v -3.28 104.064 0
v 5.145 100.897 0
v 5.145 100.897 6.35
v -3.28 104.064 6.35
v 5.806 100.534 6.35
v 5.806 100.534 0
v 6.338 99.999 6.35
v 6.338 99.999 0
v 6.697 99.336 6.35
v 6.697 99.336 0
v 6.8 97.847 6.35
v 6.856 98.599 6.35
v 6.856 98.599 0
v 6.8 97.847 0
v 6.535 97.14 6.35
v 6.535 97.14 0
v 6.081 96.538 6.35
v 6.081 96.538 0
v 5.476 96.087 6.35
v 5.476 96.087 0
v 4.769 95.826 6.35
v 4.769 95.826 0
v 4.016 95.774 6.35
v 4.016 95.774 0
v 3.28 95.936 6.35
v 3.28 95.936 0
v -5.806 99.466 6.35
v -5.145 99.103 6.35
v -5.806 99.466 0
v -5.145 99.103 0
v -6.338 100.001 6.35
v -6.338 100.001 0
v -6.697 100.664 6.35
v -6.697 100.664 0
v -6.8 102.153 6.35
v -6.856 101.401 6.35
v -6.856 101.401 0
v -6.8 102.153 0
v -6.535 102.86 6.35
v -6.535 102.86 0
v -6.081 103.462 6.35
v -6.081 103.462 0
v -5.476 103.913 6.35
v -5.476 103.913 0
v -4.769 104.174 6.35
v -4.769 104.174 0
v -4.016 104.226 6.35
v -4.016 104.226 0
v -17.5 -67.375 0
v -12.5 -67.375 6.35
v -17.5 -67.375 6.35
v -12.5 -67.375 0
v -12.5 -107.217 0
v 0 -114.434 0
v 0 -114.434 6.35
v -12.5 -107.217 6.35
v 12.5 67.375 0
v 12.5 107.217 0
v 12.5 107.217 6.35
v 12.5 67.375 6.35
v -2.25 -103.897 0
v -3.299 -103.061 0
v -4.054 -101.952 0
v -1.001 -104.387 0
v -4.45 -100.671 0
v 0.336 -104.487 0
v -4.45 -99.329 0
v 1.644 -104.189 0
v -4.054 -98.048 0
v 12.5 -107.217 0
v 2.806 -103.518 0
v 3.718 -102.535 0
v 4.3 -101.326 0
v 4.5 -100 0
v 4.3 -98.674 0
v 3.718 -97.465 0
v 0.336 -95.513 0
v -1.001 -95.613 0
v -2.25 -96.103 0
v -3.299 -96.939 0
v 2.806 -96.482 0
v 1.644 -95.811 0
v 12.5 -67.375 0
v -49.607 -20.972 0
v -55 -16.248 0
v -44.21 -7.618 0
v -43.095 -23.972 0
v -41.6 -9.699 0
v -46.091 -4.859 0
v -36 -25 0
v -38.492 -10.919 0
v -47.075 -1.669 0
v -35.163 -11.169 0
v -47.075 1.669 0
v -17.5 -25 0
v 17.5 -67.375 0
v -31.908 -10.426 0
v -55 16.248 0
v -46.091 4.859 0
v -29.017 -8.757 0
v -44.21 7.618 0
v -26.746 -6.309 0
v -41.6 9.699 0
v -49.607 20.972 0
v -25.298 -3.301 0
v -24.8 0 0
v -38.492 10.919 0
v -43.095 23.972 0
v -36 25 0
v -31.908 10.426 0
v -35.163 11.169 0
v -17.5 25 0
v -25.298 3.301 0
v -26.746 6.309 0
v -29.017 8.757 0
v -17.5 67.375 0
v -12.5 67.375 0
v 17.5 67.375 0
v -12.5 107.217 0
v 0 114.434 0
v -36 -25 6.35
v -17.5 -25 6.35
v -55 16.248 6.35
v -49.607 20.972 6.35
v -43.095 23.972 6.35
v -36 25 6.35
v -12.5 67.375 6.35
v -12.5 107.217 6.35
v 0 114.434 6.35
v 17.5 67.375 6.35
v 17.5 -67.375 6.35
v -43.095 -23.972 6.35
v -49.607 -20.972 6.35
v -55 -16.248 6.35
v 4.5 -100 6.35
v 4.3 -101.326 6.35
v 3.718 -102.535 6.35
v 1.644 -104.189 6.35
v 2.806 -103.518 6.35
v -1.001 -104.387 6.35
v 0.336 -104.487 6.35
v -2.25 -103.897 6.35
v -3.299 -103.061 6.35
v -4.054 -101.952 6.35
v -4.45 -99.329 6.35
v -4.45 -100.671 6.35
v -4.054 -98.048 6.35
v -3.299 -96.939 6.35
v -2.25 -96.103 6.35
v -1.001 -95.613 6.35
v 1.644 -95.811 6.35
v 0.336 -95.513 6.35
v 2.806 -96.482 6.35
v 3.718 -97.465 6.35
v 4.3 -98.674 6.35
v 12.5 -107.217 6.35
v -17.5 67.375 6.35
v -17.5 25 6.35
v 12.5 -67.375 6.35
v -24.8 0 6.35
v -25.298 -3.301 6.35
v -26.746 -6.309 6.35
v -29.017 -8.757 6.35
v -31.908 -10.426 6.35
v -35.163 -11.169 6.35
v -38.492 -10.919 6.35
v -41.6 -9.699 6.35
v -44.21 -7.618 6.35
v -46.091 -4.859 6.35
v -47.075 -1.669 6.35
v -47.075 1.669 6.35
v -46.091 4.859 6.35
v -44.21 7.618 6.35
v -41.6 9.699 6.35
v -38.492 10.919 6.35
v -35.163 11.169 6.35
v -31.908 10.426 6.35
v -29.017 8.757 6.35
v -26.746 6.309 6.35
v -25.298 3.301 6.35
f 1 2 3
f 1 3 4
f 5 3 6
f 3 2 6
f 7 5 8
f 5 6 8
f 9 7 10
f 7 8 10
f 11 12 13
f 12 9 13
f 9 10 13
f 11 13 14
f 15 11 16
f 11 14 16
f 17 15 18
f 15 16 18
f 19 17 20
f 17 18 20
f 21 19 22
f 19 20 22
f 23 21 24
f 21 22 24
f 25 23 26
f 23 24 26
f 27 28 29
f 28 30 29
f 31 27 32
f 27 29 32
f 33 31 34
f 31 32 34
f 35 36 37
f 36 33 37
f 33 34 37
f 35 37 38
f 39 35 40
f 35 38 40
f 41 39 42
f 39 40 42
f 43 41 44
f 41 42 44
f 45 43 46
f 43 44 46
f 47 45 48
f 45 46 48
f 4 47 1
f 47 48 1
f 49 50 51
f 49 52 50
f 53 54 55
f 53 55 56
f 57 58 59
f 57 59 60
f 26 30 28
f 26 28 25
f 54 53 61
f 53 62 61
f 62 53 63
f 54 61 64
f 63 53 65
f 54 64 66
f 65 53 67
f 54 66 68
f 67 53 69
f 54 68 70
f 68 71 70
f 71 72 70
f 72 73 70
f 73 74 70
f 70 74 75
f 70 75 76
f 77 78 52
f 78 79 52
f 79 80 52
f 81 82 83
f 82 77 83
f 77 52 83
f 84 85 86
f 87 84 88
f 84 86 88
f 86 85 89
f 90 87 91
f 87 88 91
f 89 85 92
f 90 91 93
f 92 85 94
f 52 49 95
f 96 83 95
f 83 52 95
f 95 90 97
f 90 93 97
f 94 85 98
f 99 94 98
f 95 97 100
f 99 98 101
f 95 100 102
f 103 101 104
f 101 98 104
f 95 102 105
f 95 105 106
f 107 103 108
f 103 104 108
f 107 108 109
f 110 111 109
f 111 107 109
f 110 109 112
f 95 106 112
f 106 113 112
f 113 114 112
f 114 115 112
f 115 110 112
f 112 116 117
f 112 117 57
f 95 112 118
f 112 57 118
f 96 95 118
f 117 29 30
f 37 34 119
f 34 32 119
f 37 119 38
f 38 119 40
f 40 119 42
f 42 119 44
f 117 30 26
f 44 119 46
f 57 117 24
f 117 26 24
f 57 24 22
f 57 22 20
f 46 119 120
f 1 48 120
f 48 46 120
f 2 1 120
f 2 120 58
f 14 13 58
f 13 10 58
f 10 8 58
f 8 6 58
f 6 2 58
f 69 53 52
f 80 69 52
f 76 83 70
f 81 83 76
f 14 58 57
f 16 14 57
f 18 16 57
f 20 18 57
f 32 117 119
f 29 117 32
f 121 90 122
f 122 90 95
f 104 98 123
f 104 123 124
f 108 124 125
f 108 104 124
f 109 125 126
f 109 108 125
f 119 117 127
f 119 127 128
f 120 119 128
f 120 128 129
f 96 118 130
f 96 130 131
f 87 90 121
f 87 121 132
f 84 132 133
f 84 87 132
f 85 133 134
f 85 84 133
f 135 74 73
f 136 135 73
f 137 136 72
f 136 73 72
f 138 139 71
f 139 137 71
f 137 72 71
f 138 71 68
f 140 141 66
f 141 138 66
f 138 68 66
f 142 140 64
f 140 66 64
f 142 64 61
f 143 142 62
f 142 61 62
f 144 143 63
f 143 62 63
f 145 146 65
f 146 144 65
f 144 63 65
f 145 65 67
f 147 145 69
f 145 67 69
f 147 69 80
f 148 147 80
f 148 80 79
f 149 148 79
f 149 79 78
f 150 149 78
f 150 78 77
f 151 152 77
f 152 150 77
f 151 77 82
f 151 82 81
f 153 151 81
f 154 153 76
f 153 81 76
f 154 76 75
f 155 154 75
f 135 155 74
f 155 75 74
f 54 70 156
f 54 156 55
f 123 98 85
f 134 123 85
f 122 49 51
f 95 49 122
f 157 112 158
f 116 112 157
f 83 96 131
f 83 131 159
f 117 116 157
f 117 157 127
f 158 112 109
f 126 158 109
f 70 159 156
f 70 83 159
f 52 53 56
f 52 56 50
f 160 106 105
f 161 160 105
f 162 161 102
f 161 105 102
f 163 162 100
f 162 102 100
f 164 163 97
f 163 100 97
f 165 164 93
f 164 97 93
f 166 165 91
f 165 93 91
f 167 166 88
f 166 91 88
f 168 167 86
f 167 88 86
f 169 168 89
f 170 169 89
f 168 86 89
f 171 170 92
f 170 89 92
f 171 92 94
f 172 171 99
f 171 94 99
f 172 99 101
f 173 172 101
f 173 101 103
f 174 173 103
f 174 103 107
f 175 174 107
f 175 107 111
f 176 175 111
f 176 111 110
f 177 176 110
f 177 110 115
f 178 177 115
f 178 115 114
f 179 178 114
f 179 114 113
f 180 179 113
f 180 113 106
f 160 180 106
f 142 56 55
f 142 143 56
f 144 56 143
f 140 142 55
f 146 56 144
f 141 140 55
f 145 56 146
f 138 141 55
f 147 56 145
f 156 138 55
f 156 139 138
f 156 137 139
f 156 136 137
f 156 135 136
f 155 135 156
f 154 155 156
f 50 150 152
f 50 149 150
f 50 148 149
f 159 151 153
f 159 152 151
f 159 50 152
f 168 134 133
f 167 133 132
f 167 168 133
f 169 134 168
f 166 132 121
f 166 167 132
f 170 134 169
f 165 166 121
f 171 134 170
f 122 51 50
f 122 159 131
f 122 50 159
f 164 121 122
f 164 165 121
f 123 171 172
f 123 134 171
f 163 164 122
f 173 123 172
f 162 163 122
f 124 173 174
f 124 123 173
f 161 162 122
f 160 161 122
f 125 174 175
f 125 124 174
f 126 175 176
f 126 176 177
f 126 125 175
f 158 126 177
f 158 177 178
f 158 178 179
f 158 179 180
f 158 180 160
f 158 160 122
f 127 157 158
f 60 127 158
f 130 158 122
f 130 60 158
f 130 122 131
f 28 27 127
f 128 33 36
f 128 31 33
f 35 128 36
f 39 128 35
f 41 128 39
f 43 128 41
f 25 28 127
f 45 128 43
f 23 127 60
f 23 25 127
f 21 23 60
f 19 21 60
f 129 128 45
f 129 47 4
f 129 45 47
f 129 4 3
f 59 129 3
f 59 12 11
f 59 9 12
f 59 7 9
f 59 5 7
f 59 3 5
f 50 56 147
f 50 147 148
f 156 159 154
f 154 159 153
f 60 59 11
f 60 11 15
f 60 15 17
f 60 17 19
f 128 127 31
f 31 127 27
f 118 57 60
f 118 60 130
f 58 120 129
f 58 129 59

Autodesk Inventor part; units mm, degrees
ref_plane "YZ Plane" through (0, 0, 0) normal (1, 0, 0) x (0, 1, 0)
ref_plane "XZ Plane" through (0, 0, 0) normal (0, 1, 0) x (-1, 0, 0)
ref_plane "XY Plane" through (0, 0, 0) normal (0, 0, 1) x (1, 0, 0)
sketch "Sketch1" plane through (0, 0, 0) normal (0, 0, 1) x (1, 0, 0)
  line L0 (12.5, -107.2169) -> (-12.5, -107.2169)
  line L1 (-12.5, -107.2169) -> (-12.5, 107.2169)
  line L2 (-12.5, 107.2169) -> (12.5, 107.2169)
  line L3 (12.5, 107.2169) -> (12.5, -107.2169)
  line L4 (12.5, -107.2169) -> (-12.5, 107.2169) construction
  line L5 (-12.5, -107.2169) -> (12.5, 107.2169) construction
  line L6 (0, 100) -> (0, -100) construction
  line L7 (-12.5, 107.2169) -> (0, 114.4338)
  line L8 (0, 114.4338) -> (12.5, 107.2169)
  line L9 (12.5, 107.2169) -> (12.5, 92.7831)
  line L10 (12.5, 92.7831) -> (0, 85.5662)
  line L11 (0, 85.5662) -> (-12.5, 92.7831)
  line L12 (-12.5, 92.7831) -> (-12.5, 107.2169)
  line L13 (-12.5, -107.2169) -> (-12.5, -92.7831)
  line L14 (-12.5, -92.7831) -> (0, -85.5662)
  line L15 (0, -85.5662) -> (12.5, -92.7831)
  line L16 (12.5, -92.7831) -> (12.5, -107.2169)
  line L17 (12.5, -107.2169) -> (0, -114.4338)
  line L18 (0, -114.4338) -> (-12.5, -107.2169)
  line L19 (-4.2122, 101.5835) -> (4.2122, 98.4165) construction
  line L20 (-5.1447, 99.103) -> (3.2797, 95.936)
  line L21 (5.1447, 100.897) -> (-3.2797, 104.064)
  arc A0 (-3.2797, 104.064) -> (-5.1447, 99.103) centre (-4.2122, 101.5835) ccw
  arc A1 (3.2797, 95.936) -> (5.1447, 100.897) centre (4.2122, 98.4165) ccw
  circle A2 centre (0, -100) radius 4.5
  circle A3 centre (-36, 0) radius 11.2
  circle A4 centre (-36, 0) radius 21 construction
  line L22 (-21, -14.6969) -> (-51, -14.6969) construction
  line L23 (-51, -14.6969) -> (-51, 14.6969) construction
  line L24 (-51, 14.6969) -> (-21, 14.6969) construction
  line L25 (-21, 14.6969) -> (-21, -14.6969) construction
  line L26 (-21, -14.6969) -> (-51, 14.6969) construction
  line L27 (-51, -14.6969) -> (-21, 14.6969) construction
  circle A5 centre (-36, 0) radius 25
  line L28 (-55, 16.2481) -> (-55, -16.2481)
  line L29 (-12.5, 25) -> (-36, 25)
  line L30 (-36, 25) -> (-36, -25)
  line L31 (-36, -25) -> (-12.5, -25)
  line L32 (-12.5, -25) -> (-12.5, 25)
  line L33 (17.5, -67.375) -> (-17.5, -67.375)
  line L34 (-17.5, -67.375) -> (-17.5, 67.375)
  line L35 (-17.5, 67.375) -> (17.5, 67.375)
  line L36 (17.5, 67.375) -> (17.5, -67.375)
  line L37 (17.5, -67.375) -> (-17.5, 67.375) construction
  line L38 (-17.5, -67.375) -> (17.5, 67.375) construction
  point P0 (0, 0)
  point P1 (266, 0)
  point P2 (-17.5, -25)
  point P3 (-12.5, -67.375)
  point P4 (-12.5, 67.375)
  point P5 (-17.5, 25)
  point P6 (-36, 25)
  point P7 (12.5, 67.375)
  point P8 (12.5, -67.375)
  dimension "d8" = 42
  dimension "d0" = 25
  dimension "d1" = 266
  dimension "d2" = 200
  dimension "d3" = 5.3
  dimension "d4" = 9
  dimension "d5" = 9
  dimension "d6" = 22.4
  dimension "d7" = 36
  dimension "d9" = 30
  dimension "d10" = 4
  dimension "d11" = 4
  dimension "d12" = 134.75
  dimension "d13" = 35
extrude "Extrusion1" add sketch "Sketch1" along normal blind 6.35 contours L17 L18 L0 | L0 L1 L14 L15 L3 | L15 L14 L1 L33 L3 | L33 L1 A5 L35 L3 | L3 L35 L36 L33 | L33 L34 L31 L1 | L35 L1 L11 L10 L3 | L31 L34 A5 L1 | L10 L11 L1 L2 L3 | L1 L29 L34 L35 | A5 L34 L1 | L1 A5 | L31 A5 L34 | L2 L7 L8 | L1 A5 L34 L29 | A5 L30 A3 L34 | A5 L28 L30 A3 | L34 A5 L29
sketch "Sketch2" plane through (0, 0, 6.35) normal (0, 0, 1) x (1, 0, 0)
  line L0 (-17.5, -25) -> (-17.5, -67.375) projected
  line L1 (-17.5, -67.375) -> (-12.5, -67.375) projected
  line L2 (-12.5, -67.375) -> (-12.5, -107.2169) projected
  line L3 (-12.5, -107.2169) -> (0, -114.4338) projected
  line L4 (0, -114.4338) -> (12.5, -107.2169) projected
  line L5 (12.5, -107.2169) -> (12.5, -67.375) projected
  line L6 (12.5, -67.375) -> (17.5, -67.375) projected
  line L7 (17.5, -67.375) -> (17.5, 67.375) projected
  line L8 (17.5, 67.375) -> (12.5, 67.375) projected
  line L9 (12.5, 67.375) -> (12.5, 107.2169) projected
  line L10 (12.5, 107.2169) -> (0, 114.4338) projected
  line L11 (0, 114.4338) -> (-12.5, 107.2169) projected
  line L12 (-12.5, 107.2169) -> (-12.5, 67.375) projected
  line L13 (-12.5, 67.375) -> (-17.5, 67.375) projected
  line L14 (-17.5, 67.375) -> (-17.5, 25) projected
  line L15 (-17.5, 25) -> (-36, 25) projected
  arc A0 (-36, 25) -> (-55, 16.2481) centre (-36, 0) ccw projected
  line L16 (-55, 16.2481) -> (-55, -16.2481) projected
  arc A1 (-55, -16.2481) -> (-36, -25) centre (-36, 0) ccw projected
  line L17 (-36, -25) -> (-17.5, -25) projected
  circle A2 centre (-36, 0) radius 11.2 projected
  arc A3 (-3.2797, 104.064) -> (-5.1447, 99.103) centre (-4.2122, 101.5835) ccw projected
  line L18 (-3.2797, 104.064) -> (5.1447, 100.897) projected
  arc A4 (3.2797, 95.936) -> (5.1447, 100.897) centre (4.2122, 98.4165) ccw projected
  line L19 (3.2797, 95.936) -> (-5.1447, 99.103) projected
  circle A5 centre (0, -100) radius 4.5 projected
  circle A6 centre (-13.25, 68.125) radius 1.375
  point P0 (0, 0)
  point P1 (-12.5, 69.2774)
  point P2 (-14.4024, 67.375)
  dimension "d16" = 0.75
  dimension "d17" = 2.75
  dimension "d18" = 0.75
sketch "Sketch3" plane through (0, 0, 6.35) normal (0, 0, 1) x (1, 0, 0)
  circle A0 centre (0, -100) radius 4.5 projected
  arc A1 (-3.2797, 104.064) -> (-5.1447, 99.103) centre (-4.2122, 101.5835) ccw projected
  line L0 (-3.2797, 104.064) -> (5.1447, 100.897) projected
  arc A2 (3.2797, 95.936) -> (5.1447, 100.897) centre (4.2122, 98.4165) ccw projected
  line L1 (3.2797, 95.936) -> (-5.1447, 99.103) projected
  circle A3 centre (-36, 0) radius 11.2 projected
  arc A4 (14.4024, -67.375) -> (12.5, -69.2774) centre (13.25, -68.125) ccw projected
  line L2 (14.4024, -67.375) -> (17.5, -67.375) projected
  line L3 (17.5, -67.375) -> (17.5, 67.375) projected
  line L4 (17.5, 67.375) -> (14.4024, 67.375) projected
  arc A5 (12.5, 69.2774) -> (14.4024, 67.375) centre (13.25, 68.125) ccw projected
  line L5 (12.5, 69.2774) -> (12.5, 107.2169) projected
  line L6 (12.5, 107.2169) -> (0, 114.4338) projected
  line L7 (0, 114.4338) -> (-12.5, 107.2169) projected
  line L8 (-12.5, 107.2169) -> (-12.5, 69.2774) projected
  arc A6 (-14.4024, 67.375) -> (-12.5, 69.2774) centre (-13.25, 68.125) ccw projected
  line L9 (-14.4024, 67.375) -> (-17.5, 67.375) projected
  line L10 (-17.5, 67.375) -> (-17.5, 25) projected
  line L11 (-17.5, 25) -> (-36, 25) projected
  arc A7 (-36, 25) -> (-55, 16.2481) centre (-36, 0) ccw projected
  line L12 (-55, 16.2481) -> (-55, -16.2481) projected
  arc A8 (-55, -16.2481) -> (-36, -25) centre (-36, 0) ccw projected
  line L13 (-36, -25) -> (-17.5, -25) projected
  line L14 (-17.5, -25) -> (-17.5, -67.375) projected
  line L15 (-17.5, -67.375) -> (-14.4024, -67.375) projected
  arc A9 (-12.5, -69.2774) -> (-14.4024, -67.375) centre (-13.25, -68.125) ccw projected
  line L16 (-12.5, -69.2774) -> (-12.5, -107.2169) projected
  line L17 (-12.5, -107.2169) -> (0, -114.4338) projected
  line L18 (0, -114.4338) -> (12.5, -107.2169) projected
  line L19 (12.5, -107.2169) -> (12.5, -69.2774) projected
  circle A10 centre (-36, 0) radius 16 construction
  line L20 (-36, 0) -> (-24.6863, 11.3137) construction
  line L21 (-36, 0) -> (-36, 16) construction
  line L22 (-36, 0) -> (-36, -16) construction
  line L23 (-47.3137, -11.3137) -> (-24.6863, -11.3137) construction
  line L24 (-24.6863, -11.3137) -> (-24.6863, 11.3137) construction
  line L25 (-24.6863, 11.3137) -> (-47.3137, 11.3137) construction
  line L26 (-47.3137, 11.3137) -> (-47.3137, -11.3137) construction
  line L27 (-47.3137, -11.3137) -> (-24.6863, 11.3137) construction
  line L28 (-24.6863, -11.3137) -> (-47.3137, 11.3137) construction
  point P0 (0, 0)
  dimension "d21" = 32
  dimension "d22" = 45
sketch "Sketch4" plane through (0, 0, 6.35) normal (0, 0, 1) x (1, 0, 0)
  line L0 (10, -57.375) -> (-10, -57.375) construction
  line L1 (-10, -57.375) -> (-10, 57.375) construction
  line L2 (-10, 57.375) -> (10, 57.375) construction
  line L3 (10, 57.375) -> (10, -57.375) construction
  line L4 (10, -57.375) -> (-10, 57.375) construction
  line L5 (-10, -57.375) -> (10, 57.375) construction
  line L6 (-17.5, -67.375) -> (-14.4024, -67.375) construction
  point P0 (0, 0)
  point P1 (-10, 0)
  point P2 (10, 0)
  dimension "d30" = 20
  dimension "d32" = 10
equation "\"d11\" = d10"
equation "\"d18\" = d16"
properties part number "Z-Axis Nut and Bed Plate" material "Aluminum 6061"
